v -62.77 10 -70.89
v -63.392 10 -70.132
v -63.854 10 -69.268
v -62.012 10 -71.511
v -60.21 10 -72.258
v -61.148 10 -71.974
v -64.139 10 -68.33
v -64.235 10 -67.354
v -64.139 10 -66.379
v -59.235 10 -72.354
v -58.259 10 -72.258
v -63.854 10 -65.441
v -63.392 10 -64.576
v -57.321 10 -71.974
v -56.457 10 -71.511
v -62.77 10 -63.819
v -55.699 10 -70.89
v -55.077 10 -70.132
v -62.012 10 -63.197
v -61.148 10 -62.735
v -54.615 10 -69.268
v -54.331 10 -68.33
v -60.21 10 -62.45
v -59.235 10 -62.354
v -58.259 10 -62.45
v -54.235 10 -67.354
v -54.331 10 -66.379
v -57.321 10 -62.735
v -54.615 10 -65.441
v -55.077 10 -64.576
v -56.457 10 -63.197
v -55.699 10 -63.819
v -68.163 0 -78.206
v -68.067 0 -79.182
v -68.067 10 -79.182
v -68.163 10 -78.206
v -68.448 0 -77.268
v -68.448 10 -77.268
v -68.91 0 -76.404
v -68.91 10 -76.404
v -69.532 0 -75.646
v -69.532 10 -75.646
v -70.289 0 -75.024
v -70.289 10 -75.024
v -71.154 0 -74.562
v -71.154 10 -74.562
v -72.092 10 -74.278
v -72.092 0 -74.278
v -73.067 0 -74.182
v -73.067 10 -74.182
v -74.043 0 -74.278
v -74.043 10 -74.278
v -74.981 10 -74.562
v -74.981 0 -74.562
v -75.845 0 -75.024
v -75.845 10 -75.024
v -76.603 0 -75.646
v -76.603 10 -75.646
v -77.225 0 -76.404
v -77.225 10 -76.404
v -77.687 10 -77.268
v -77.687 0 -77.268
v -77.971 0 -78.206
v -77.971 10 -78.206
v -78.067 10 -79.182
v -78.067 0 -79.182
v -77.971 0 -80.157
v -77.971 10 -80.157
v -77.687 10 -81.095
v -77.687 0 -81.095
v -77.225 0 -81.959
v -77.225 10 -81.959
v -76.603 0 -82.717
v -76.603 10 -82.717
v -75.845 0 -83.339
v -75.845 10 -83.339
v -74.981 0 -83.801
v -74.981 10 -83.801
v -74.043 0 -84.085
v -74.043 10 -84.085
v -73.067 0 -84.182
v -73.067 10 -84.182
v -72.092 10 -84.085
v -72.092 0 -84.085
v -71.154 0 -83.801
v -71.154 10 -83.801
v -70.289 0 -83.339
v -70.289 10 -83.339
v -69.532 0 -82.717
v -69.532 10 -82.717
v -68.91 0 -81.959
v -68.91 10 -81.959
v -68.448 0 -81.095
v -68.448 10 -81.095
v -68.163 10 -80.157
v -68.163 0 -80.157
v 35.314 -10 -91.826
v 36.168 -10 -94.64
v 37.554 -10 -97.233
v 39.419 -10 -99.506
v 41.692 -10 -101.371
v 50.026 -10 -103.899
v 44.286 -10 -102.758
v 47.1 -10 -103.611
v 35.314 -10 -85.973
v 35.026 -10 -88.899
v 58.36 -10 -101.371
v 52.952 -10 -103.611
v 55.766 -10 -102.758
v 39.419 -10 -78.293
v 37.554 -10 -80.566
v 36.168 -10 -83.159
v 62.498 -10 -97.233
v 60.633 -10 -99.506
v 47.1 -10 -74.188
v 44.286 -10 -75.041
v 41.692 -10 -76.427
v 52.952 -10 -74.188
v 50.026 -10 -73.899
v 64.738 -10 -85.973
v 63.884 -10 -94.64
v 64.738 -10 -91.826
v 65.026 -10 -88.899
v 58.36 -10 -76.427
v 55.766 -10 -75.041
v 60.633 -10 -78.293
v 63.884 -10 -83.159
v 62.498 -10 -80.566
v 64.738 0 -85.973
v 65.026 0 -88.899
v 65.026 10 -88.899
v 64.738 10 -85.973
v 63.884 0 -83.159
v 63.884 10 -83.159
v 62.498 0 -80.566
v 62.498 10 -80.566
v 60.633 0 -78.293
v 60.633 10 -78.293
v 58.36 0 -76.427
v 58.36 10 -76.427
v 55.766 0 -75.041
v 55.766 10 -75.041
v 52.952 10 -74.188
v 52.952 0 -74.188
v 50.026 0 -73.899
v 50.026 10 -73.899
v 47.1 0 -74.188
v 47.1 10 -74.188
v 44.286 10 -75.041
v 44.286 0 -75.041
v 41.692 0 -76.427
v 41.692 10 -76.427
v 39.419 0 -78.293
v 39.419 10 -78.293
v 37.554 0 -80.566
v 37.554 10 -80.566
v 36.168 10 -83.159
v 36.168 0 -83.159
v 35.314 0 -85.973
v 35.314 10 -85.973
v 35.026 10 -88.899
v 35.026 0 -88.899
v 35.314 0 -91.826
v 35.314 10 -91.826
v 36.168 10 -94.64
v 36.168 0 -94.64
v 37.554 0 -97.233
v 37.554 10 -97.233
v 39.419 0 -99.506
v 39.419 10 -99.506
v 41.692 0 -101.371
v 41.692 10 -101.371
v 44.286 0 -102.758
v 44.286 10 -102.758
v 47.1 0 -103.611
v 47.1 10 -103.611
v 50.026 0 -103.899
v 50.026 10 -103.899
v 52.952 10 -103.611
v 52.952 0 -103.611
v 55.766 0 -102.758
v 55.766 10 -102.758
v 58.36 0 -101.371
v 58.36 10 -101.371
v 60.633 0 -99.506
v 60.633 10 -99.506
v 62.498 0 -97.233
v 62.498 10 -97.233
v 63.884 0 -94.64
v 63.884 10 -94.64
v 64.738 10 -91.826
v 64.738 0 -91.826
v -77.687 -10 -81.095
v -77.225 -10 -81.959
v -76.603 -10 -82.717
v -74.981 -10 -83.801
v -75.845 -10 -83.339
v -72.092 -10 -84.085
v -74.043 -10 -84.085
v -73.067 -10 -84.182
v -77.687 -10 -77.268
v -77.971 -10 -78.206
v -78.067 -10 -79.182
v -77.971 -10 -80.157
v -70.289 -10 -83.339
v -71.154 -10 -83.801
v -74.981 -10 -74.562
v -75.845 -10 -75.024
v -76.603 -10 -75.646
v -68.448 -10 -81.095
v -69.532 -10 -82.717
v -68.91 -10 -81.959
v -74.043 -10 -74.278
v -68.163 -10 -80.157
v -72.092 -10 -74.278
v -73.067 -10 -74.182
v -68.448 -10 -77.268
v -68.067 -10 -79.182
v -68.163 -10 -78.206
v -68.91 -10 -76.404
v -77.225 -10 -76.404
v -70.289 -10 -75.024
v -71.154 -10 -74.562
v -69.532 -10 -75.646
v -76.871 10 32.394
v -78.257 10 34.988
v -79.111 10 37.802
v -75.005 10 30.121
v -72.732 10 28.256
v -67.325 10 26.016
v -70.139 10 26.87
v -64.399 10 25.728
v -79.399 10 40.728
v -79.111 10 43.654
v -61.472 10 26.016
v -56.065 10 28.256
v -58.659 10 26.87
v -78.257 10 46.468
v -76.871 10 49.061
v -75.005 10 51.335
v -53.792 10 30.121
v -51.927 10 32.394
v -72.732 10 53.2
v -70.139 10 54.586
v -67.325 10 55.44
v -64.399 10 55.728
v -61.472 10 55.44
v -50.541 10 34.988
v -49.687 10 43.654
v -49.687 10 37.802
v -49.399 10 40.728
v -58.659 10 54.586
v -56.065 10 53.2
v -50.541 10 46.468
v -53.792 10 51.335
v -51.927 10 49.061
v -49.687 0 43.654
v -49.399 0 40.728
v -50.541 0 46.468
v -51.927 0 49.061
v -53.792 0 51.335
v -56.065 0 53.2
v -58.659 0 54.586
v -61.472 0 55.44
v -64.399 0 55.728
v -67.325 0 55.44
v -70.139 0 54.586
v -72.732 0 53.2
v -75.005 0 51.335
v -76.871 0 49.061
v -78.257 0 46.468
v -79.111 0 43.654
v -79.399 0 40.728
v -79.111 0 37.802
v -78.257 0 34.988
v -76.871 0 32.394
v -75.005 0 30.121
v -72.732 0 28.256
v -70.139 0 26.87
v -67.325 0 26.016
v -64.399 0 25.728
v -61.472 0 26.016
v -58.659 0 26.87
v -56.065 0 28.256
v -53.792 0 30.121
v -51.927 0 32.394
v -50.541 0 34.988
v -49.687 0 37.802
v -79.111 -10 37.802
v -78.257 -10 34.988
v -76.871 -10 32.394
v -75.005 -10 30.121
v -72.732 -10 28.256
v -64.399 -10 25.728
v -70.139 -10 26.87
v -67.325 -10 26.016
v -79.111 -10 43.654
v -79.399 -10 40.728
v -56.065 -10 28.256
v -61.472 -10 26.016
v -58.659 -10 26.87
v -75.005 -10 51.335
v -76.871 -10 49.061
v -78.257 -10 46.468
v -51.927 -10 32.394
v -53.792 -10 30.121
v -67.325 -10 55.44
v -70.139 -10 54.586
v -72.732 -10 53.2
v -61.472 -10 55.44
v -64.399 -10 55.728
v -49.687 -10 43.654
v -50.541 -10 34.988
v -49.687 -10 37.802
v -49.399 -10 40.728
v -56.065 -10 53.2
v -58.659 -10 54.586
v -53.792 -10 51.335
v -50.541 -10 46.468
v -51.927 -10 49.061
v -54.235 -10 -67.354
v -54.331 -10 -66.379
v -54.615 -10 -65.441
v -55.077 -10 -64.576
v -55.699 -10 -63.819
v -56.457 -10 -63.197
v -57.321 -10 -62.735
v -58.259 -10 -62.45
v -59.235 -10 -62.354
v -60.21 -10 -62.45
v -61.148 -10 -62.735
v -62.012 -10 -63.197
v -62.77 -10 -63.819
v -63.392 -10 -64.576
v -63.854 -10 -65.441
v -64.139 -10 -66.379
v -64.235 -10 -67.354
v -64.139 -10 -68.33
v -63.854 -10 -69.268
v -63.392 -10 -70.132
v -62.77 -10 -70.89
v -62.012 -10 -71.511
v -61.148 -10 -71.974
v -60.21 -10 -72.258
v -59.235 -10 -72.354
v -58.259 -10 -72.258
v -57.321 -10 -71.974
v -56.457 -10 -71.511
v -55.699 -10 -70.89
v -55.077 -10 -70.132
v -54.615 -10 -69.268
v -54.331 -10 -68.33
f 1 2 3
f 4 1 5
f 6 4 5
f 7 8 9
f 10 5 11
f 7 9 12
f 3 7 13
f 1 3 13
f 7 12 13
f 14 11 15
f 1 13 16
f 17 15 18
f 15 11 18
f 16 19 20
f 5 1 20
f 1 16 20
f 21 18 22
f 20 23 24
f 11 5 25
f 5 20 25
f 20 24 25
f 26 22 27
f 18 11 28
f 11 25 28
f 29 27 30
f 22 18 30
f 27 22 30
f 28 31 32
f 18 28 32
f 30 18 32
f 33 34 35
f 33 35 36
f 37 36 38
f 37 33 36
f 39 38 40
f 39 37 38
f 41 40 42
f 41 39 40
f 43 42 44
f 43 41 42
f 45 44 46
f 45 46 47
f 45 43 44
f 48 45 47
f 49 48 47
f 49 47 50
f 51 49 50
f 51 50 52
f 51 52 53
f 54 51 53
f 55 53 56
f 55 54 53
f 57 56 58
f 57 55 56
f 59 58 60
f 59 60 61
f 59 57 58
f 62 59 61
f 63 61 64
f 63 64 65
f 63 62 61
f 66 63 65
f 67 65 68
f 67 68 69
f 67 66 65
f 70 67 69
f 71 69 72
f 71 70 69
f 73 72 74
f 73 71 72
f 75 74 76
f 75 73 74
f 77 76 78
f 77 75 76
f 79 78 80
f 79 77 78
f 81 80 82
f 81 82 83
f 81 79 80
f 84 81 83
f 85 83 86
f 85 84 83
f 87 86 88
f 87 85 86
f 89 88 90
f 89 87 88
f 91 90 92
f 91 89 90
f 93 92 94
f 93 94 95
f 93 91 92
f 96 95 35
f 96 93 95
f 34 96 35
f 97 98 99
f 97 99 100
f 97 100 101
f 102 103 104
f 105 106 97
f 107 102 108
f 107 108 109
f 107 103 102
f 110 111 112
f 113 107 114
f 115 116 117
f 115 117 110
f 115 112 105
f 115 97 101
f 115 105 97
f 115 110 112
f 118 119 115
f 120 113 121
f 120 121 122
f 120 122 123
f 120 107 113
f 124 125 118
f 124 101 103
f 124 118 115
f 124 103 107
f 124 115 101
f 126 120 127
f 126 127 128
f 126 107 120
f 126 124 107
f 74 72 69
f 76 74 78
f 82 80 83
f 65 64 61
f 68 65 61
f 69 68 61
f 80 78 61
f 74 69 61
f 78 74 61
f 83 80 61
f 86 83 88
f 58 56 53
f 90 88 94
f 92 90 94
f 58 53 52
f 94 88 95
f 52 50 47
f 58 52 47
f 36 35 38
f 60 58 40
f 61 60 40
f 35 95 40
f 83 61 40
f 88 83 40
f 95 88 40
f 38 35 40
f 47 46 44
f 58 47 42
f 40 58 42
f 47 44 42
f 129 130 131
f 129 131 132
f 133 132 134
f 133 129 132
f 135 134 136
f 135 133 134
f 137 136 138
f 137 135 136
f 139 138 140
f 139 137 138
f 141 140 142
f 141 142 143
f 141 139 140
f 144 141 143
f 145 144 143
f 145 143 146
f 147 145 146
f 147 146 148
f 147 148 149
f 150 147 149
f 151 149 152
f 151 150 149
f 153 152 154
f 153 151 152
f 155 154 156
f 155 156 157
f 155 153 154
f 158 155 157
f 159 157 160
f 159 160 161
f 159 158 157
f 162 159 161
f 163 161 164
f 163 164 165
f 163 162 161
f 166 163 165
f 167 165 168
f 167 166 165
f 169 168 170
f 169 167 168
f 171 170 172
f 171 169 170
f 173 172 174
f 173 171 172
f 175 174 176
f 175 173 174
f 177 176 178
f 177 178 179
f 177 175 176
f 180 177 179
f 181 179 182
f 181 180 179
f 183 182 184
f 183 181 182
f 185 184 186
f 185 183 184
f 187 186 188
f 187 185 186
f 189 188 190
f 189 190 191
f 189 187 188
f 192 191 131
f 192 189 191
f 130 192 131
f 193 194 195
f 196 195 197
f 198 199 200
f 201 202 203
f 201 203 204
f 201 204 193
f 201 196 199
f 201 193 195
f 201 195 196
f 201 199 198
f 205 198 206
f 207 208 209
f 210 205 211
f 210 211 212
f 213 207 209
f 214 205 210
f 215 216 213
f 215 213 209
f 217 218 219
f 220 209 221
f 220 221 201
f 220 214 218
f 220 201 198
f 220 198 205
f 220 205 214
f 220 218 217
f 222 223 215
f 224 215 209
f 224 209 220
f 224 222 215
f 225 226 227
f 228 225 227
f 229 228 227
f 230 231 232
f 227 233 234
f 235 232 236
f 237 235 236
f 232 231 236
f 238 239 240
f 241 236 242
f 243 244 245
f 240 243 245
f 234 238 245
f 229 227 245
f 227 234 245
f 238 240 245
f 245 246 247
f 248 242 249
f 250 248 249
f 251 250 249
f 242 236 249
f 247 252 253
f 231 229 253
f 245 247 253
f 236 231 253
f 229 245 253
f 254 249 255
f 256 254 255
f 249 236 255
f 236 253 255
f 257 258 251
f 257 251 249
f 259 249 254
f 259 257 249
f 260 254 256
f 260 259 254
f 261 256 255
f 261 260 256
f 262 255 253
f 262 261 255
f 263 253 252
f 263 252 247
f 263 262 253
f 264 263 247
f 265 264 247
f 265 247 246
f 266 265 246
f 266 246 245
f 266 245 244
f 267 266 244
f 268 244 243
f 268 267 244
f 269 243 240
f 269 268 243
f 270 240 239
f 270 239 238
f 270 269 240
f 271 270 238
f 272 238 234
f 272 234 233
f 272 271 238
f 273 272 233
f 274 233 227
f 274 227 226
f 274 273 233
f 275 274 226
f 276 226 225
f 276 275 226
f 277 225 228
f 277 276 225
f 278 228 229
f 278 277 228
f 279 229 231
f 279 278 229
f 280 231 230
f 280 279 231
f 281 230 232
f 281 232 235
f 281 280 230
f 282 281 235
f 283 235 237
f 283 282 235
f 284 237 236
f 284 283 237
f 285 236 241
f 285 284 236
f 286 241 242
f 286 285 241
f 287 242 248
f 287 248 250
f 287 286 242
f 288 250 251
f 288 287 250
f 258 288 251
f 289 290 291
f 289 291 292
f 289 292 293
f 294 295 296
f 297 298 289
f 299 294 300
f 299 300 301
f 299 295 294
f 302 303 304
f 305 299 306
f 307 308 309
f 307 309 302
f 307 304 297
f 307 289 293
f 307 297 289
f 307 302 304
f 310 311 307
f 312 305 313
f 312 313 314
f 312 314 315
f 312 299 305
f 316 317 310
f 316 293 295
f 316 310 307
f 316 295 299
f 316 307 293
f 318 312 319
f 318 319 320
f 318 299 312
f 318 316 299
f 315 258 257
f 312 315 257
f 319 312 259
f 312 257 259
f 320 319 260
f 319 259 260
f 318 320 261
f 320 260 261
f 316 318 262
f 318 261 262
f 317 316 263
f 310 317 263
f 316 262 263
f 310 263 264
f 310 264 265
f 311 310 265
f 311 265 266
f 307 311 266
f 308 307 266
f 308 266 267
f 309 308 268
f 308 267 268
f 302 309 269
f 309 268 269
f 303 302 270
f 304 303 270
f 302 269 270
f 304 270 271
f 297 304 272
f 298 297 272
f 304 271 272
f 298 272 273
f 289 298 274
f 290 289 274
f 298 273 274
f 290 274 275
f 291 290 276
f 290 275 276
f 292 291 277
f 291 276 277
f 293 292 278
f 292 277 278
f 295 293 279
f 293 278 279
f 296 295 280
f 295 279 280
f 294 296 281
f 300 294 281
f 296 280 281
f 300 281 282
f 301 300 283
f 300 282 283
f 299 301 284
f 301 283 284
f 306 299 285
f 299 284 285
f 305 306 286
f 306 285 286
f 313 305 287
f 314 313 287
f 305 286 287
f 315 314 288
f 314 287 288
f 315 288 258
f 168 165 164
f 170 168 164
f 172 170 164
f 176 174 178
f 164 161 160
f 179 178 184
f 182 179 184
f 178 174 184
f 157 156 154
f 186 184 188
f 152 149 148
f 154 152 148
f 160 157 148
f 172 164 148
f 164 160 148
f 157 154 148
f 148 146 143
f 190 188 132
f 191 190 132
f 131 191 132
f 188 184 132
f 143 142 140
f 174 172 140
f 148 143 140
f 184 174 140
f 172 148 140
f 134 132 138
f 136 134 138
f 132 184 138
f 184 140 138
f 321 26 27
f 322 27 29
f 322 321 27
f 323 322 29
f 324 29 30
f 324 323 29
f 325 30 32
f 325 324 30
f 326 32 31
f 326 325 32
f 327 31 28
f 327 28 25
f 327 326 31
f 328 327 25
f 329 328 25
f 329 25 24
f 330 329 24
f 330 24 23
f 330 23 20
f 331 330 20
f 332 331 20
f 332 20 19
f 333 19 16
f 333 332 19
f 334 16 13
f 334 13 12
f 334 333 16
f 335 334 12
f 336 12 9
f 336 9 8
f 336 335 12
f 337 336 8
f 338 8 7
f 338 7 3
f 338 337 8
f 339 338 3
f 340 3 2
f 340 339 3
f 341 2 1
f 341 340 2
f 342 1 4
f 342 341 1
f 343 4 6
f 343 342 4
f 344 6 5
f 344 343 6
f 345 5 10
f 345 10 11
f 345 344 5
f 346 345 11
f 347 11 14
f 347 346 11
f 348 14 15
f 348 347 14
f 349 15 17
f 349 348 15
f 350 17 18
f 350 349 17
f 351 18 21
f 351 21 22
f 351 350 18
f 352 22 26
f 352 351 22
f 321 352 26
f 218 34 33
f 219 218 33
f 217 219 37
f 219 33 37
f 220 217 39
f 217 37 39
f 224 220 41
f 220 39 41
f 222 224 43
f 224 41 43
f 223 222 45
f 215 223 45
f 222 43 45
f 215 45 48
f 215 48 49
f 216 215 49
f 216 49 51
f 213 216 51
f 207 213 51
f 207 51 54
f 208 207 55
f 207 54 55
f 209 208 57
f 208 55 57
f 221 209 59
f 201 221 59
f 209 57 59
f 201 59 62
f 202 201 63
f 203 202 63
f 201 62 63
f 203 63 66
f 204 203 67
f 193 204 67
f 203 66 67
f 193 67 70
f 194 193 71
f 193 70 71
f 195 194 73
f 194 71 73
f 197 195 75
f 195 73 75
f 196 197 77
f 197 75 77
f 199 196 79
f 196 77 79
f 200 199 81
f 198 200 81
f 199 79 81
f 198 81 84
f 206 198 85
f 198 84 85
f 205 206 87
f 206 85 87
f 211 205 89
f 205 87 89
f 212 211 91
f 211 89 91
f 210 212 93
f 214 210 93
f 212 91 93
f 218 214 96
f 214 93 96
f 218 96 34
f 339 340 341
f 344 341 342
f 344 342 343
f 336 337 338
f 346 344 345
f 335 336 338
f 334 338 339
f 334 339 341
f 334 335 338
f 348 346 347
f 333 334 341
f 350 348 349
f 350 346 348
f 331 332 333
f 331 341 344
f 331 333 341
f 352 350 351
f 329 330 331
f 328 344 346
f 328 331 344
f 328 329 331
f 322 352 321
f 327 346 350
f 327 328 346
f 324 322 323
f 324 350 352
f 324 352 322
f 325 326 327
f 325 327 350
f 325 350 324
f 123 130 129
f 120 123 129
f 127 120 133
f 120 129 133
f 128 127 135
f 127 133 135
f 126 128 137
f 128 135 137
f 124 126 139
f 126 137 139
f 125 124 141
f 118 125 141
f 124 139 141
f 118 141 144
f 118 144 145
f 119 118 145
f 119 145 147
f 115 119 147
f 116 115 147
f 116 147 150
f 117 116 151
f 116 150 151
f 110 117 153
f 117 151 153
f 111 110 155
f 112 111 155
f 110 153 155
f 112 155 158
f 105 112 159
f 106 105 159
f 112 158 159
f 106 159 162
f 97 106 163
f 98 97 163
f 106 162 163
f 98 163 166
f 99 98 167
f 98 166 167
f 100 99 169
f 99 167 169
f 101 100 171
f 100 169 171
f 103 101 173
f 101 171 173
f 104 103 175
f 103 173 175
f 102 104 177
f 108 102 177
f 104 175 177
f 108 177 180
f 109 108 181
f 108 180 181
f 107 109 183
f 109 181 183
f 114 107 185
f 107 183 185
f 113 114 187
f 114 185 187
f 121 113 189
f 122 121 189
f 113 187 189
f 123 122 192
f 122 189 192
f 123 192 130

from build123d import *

# Parameters (mm, degrees)
F0_R     = 15
F0_R_2   = 5
F1_DEPTH = 10


with BuildPart() as f1:
    # F0 (on Front) → F1 (new body, symmetric)
    with BuildSketch(Plane.XZ):
        with Locations((-64.398845, 40.727912)):
            Circle(F0_R)
        with Locations((50.025977, -88.899314)):
            Circle(F0_R)
        with Locations((-73.067203, -79.181537)):
            Circle(F0_R_2)
        with Locations((-59.234619, -67.354135)):
            Circle(F0_R_2)
    extrude(amount=F1_DEPTH, both=True)


solid = f1.part
